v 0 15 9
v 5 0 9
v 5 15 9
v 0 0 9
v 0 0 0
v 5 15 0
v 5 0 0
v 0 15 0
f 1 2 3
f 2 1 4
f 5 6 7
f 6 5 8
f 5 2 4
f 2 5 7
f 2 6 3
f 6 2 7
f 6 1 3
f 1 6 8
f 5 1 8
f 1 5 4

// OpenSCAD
// Generated by SolidPython 1.0.1 on 2020-07-29 00:46:54


cube(size = [5, 15, 9]);
/***********************************************
*********      SolidPython code:      **********
************************************************
 
# import packages: SolidPython
from solid import *
from solid.utils import *
from itertools import chain, combinations, permutations


class Resize:

    def __init__(self, scad_file):
        self.scad_file = scad_file
        #self.scad_file = import_scad(scad_file)
        # cone/cylinder param:
        self.r1 = 0
        self.r2 = 0
        self.h = 0
        # rectangular prism param:
        self.w = 0
        self.l = 0
        # ellipse param:
        self.r = 0

    # import OpenScad code (file name corresponds to shape)


    # classify shape + parameters
    def assign(self, param1, param2, param3):
        if self.scad_file == 'cone.scad':
            self.r1 = param1
            self.r2 = param2
            self.h = param3
        elif self.scad_file == 'cylinder.scad':
            self.r1 = param1
            self.r2 = param2
            self.h = param3
        elif self.scad_file == 'rectangularPrism.scad':
            self.h = param1
            self.l = param2
            self.w = param3
        else:
            self.r = param1
            self.h = param2

    # resize parameters
    def iterate(self):
        x = range(3, 20, 2)
        i = 1
        if self.scad_file == 'cone.scad':
            tempList = list(permutations(x, 2))
            for temp in tempList:
                param1 = temp[0]
                param2 = temp[1]
                filepath = 'produced_scad_files/' + 'cone' + str(param1) + '_' + str(param2) + '_' + '.scad'
                scad_render_to_file(cylinder(h=param1, r1=param2, r2=0), filepath)

        elif self.scad_file == 'cylinder.scad':
            tempList = list(permutations(x, 3))
            for temp in tempList:
                param1 = temp[0]
                param2 = temp[1]
                filepath = 'produced_scad_files/' + 'cylinder' + str(param1) + '_' + str(param2) + '_' + '.scad'
                scad_render_to_file(cylinder(h=param1, r1=param2, r2=param2), filepath)

        elif self.scad_file == 'rectangularPrism.scad':
            tempList = list(permutations(x, 3))
            for temp in tempList:
                param1 = temp[0]
                param2 = temp[1]
                param3 = temp[2]
                filepath = 'produced_scad_files/' + 'rectangularPrism' + str(param1) + '_' + str(param2) + '_' + str(
                    param3) + '.scad'
                scad_render_to_file(cube(size=(param1, param2, param3)), filepath)

        elif self.scad_file == 'ellipse.scad':
            tempList = list(permutations(x, 4))
            for temp in tempList:
                param1 = temp[0]
                param2 = temp[1]
                param3 = temp[2]
                param4 = temp[3]
                filepath = 'produced_scad_files/' + 'ellipse' + str(param1) + '_' + str(param2) + '_' + str(param3) + '_' + str(param4) + '.scad'
                scad_render_to_file(scale([param1, param2, param3])(sphere(r=param4)), filepath)

    def render_to_scadfile(self):
        scad_render_to_file(scad, 'example.scad') 
 
************************************************/
